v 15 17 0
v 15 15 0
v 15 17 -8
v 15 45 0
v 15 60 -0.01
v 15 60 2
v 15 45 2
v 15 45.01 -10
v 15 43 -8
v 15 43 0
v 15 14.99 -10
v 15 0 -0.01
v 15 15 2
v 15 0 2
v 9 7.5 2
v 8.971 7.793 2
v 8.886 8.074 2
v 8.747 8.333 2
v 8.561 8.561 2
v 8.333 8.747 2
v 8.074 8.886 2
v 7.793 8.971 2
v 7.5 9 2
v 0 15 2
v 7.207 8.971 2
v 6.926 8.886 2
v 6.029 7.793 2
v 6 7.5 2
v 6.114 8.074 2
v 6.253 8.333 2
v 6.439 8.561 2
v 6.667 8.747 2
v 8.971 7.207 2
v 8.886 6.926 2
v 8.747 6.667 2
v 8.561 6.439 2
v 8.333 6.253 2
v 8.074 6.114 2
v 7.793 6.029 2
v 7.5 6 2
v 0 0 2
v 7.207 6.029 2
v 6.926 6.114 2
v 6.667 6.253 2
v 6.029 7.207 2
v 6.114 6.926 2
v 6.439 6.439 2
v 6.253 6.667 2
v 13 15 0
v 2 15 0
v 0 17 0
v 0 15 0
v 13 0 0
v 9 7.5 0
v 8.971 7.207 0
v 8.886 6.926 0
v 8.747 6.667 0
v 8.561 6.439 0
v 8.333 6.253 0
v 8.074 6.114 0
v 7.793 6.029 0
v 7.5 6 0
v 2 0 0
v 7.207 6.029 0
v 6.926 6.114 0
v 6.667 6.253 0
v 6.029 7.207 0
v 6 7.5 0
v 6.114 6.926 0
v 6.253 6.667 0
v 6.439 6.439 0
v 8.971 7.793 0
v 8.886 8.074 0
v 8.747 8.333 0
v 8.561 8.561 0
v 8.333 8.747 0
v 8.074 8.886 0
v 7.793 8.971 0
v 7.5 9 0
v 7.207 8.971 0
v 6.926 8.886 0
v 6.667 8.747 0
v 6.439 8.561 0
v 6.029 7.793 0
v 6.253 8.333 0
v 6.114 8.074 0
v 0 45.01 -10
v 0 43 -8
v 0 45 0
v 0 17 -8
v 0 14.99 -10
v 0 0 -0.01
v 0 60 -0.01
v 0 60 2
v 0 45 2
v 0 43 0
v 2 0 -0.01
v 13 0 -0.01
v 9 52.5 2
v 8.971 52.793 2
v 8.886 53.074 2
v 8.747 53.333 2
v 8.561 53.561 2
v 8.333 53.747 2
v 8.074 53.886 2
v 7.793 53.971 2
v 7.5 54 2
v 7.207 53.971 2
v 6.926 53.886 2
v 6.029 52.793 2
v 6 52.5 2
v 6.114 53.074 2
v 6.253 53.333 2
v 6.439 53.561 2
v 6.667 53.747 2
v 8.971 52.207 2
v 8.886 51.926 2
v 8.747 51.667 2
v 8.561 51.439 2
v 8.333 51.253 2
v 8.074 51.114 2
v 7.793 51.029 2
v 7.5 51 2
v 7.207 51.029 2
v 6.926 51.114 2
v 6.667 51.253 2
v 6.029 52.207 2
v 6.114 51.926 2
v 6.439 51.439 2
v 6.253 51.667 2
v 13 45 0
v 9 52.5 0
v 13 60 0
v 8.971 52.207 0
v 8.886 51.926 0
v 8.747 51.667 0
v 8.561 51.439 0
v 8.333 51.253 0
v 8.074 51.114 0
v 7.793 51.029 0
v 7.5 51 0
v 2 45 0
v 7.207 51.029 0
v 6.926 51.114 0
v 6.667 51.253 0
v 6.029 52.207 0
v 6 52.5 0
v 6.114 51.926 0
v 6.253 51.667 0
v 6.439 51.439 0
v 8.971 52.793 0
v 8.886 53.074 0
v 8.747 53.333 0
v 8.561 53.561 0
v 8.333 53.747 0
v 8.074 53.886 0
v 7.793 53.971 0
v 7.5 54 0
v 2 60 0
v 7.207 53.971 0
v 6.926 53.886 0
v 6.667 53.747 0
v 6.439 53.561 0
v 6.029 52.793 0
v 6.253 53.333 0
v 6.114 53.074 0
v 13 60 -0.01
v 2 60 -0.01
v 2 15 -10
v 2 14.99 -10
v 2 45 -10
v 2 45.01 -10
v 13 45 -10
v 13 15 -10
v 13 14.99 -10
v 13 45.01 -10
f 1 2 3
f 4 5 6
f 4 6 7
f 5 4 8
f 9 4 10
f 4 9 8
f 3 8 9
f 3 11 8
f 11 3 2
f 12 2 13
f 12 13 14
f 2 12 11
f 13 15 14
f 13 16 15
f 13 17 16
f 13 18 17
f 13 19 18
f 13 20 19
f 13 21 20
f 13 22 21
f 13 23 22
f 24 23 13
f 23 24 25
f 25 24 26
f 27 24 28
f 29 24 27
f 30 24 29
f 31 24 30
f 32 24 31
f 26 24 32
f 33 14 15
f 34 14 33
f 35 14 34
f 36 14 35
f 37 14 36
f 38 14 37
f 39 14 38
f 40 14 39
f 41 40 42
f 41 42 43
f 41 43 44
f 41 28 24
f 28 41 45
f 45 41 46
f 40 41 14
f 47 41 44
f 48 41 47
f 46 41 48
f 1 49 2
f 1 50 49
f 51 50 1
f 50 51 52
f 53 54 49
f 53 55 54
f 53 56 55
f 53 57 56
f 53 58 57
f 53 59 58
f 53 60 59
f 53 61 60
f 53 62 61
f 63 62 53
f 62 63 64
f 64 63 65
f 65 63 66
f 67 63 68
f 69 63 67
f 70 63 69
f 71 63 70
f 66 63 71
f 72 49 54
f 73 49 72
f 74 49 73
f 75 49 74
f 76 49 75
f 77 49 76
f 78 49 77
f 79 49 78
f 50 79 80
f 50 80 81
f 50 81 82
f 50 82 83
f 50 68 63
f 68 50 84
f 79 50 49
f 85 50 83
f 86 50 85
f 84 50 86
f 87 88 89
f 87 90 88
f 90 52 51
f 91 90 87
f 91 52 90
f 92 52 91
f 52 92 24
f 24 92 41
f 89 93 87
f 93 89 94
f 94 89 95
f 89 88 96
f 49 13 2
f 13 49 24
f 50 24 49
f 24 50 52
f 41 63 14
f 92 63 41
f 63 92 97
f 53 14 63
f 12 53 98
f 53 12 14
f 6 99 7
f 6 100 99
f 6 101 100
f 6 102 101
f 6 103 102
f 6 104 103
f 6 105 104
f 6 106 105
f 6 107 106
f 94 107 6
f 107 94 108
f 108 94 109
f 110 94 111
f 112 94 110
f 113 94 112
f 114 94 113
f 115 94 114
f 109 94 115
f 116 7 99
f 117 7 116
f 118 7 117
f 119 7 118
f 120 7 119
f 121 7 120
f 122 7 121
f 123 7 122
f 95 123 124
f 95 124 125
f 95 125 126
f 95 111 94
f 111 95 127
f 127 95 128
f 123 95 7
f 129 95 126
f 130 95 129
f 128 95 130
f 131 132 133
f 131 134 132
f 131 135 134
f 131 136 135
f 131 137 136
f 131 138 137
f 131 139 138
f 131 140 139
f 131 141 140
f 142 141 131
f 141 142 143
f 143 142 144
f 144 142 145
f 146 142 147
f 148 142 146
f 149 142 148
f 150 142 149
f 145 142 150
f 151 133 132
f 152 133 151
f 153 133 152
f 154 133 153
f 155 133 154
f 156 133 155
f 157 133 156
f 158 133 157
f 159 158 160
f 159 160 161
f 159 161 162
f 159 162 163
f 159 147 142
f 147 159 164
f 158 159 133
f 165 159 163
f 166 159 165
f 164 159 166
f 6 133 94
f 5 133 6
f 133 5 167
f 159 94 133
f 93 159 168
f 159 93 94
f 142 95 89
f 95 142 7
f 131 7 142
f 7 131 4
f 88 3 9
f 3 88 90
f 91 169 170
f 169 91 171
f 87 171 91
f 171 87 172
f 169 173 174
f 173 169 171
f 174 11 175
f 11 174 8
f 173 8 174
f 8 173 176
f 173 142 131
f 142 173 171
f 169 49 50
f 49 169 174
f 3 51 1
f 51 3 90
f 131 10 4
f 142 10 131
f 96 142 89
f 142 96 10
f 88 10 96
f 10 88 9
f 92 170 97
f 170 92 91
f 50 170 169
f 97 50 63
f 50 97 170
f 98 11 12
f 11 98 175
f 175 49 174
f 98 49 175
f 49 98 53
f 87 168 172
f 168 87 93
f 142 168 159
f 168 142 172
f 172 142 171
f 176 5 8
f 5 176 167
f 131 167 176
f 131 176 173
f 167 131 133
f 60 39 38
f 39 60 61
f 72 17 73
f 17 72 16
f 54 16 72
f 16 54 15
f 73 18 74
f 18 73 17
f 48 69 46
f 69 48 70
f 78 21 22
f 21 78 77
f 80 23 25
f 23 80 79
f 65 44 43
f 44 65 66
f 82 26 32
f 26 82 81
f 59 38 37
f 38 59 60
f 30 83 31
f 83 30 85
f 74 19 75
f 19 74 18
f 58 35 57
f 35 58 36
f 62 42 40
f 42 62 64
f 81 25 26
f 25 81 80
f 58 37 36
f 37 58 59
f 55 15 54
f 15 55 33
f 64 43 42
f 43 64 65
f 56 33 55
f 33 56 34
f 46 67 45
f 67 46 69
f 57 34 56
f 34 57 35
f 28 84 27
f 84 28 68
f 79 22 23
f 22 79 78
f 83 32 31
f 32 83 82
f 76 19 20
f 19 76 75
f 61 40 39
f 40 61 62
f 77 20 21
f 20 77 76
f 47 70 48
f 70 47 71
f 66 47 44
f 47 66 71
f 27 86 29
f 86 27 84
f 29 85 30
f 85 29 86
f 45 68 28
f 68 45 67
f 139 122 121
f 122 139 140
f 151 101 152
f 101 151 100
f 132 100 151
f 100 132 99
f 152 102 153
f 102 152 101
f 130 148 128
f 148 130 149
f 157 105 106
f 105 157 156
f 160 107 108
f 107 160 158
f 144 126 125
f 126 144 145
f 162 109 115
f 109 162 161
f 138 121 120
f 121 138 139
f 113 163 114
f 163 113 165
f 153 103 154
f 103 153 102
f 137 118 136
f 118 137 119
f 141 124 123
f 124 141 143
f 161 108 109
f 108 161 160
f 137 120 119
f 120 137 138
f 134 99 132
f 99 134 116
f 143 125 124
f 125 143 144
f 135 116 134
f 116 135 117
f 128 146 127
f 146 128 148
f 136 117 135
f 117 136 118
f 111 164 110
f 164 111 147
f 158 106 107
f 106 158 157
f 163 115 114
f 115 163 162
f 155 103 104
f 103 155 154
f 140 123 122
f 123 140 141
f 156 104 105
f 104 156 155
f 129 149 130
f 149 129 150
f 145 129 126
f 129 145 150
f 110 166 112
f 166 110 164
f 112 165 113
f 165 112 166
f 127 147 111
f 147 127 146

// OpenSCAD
// Wire holder: two overhangs with triangular gussets connected by a bridge
// Walls between each pair of gussets linking overhang tabs to bridge
// Walls positioned at gusset vertical edge, extending into bridge gap
// Based on 8bitdo_v013 overhang/gusset dimensions

// Overhang dimensions (from 8bitdo reference)
overhang_width = 15;
overhang_length = 15;
overhang_thickness = 2;

// Gusset dimensions
gusset_thickness = 2;
gusset_height = 10;

// Screw hole
screw_hole_d = 3;

// Bridge dimensions
bridge_span = 30;       // distance between the two overhangs
bridge_thickness = 2;
bridge_width = 15;      // same as overhang_width

// Wall thickness (between gusset pairs)
wall_thickness = 2;

// Gusset module: right-triangle brace
module gusset(length, height, thickness) {
    hull() {
        cube([thickness, 0.01, height]);
        translate([0, length - 0.01, height - 0.01])
            cube([thickness, 0.01, 0.01]);
    }
}

difference() {
    union() {
        // Left overhang (mounts to surface)
        translate([0, 0, 0])
            cube([overhang_width, overhang_length, overhang_thickness]);

        // Right overhang (mounts to surface)
        translate([0, overhang_length + bridge_span, 0])
            cube([overhang_width, overhang_length, overhang_thickness]);

        // Bridge connecting the two overhangs below
        translate([0, overhang_length, -gusset_height])
            cube([bridge_width, bridge_span, bridge_thickness]);

        // Wall between left gussets (extends into bridge gap, flush with gusset vertical edge)
        translate([0, overhang_length, -gusset_height])
            cube([overhang_width, wall_thickness, gusset_height]);

        // Wall between right gussets (extends into bridge gap, flush with gusset vertical edge)
        translate([0, overhang_length + bridge_span - wall_thickness, -gusset_height])
            cube([overhang_width, wall_thickness, gusset_height]);

        // Gussets - left overhang
        translate([0, overhang_length, -gusset_height])
            mirror([0, 1, 0])
                gusset(overhang_length, gusset_height, gusset_thickness);
        translate([overhang_width - gusset_thickness, overhang_length, -gusset_height])
            mirror([0, 1, 0])
                gusset(overhang_length, gusset_height, gusset_thickness);

        // Gussets - right overhang
        translate([0, overhang_length + bridge_span, -gusset_height])
            gusset(overhang_length, gusset_height, gusset_thickness);
        translate([overhang_width - gusset_thickness, overhang_length + bridge_span, -gusset_height])
            gusset(overhang_length, gusset_height, gusset_thickness);
    }

    // Screw holes in overhang tabs
    translate([overhang_width / 2, overhang_length / 2, -1])
        cylinder(h = overhang_thickness + 2, d = screw_hole_d, $fn = 32);
    translate([overhang_width / 2, overhang_length + bridge_span + overhang_length / 2, -1])
        cylinder(h = overhang_thickness + 2, d = screw_hole_d, $fn = 32);
}
